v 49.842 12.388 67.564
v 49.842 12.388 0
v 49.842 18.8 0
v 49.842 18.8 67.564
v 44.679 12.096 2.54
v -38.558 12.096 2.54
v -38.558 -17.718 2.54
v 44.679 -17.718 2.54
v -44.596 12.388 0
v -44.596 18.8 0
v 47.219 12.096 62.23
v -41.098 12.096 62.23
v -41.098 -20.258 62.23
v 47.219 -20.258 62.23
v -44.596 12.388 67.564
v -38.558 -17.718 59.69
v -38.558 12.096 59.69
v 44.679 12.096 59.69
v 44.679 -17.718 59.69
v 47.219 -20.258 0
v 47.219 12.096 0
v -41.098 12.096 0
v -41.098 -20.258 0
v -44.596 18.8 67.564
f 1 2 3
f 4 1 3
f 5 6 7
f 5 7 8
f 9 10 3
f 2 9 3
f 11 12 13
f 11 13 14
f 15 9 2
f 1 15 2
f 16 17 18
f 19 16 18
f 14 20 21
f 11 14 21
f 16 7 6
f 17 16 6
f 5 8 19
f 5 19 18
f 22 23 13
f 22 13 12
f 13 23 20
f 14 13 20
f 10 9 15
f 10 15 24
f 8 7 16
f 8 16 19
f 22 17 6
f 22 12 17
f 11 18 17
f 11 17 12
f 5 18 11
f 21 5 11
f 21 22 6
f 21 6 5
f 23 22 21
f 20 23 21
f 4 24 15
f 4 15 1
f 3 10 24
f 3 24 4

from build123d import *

# Parameters (mm, degrees)
F0_W     = 88.317048
F0_H     = 32.353772
F1_DEPTH = 62.23
F2_T     = -2.54
F3_W     = 94.438031
F3_H     = 6.412459
F4_DEPTH = 67.564


with BuildPart() as f1:
    # F0 (on Top) → F1 (new body)
    with BuildSketch(Plane.XY):
        with Locations((3.060492, -4.080656)):
            Rectangle(F0_W, F0_H)
    extrude(amount=F1_DEPTH)

    # F2
    f2_openings = [f1.faces().sort_by_distance(p)[0] for p in [
        (3.060492, 12.09623, 31.115),
    ]]
    offset(amount=F2_T, openings=f2_openings)


with BuildPart() as f4:
    # F3 (on Top) → F4 (new body)
    with BuildSketch(Plane.XY):
        with Locations((2.623278, 15.593934)):
            Rectangle(F3_W, F3_H)
    extrude(amount=F4_DEPTH)


solid = Compound([f1.part, f4.part])
